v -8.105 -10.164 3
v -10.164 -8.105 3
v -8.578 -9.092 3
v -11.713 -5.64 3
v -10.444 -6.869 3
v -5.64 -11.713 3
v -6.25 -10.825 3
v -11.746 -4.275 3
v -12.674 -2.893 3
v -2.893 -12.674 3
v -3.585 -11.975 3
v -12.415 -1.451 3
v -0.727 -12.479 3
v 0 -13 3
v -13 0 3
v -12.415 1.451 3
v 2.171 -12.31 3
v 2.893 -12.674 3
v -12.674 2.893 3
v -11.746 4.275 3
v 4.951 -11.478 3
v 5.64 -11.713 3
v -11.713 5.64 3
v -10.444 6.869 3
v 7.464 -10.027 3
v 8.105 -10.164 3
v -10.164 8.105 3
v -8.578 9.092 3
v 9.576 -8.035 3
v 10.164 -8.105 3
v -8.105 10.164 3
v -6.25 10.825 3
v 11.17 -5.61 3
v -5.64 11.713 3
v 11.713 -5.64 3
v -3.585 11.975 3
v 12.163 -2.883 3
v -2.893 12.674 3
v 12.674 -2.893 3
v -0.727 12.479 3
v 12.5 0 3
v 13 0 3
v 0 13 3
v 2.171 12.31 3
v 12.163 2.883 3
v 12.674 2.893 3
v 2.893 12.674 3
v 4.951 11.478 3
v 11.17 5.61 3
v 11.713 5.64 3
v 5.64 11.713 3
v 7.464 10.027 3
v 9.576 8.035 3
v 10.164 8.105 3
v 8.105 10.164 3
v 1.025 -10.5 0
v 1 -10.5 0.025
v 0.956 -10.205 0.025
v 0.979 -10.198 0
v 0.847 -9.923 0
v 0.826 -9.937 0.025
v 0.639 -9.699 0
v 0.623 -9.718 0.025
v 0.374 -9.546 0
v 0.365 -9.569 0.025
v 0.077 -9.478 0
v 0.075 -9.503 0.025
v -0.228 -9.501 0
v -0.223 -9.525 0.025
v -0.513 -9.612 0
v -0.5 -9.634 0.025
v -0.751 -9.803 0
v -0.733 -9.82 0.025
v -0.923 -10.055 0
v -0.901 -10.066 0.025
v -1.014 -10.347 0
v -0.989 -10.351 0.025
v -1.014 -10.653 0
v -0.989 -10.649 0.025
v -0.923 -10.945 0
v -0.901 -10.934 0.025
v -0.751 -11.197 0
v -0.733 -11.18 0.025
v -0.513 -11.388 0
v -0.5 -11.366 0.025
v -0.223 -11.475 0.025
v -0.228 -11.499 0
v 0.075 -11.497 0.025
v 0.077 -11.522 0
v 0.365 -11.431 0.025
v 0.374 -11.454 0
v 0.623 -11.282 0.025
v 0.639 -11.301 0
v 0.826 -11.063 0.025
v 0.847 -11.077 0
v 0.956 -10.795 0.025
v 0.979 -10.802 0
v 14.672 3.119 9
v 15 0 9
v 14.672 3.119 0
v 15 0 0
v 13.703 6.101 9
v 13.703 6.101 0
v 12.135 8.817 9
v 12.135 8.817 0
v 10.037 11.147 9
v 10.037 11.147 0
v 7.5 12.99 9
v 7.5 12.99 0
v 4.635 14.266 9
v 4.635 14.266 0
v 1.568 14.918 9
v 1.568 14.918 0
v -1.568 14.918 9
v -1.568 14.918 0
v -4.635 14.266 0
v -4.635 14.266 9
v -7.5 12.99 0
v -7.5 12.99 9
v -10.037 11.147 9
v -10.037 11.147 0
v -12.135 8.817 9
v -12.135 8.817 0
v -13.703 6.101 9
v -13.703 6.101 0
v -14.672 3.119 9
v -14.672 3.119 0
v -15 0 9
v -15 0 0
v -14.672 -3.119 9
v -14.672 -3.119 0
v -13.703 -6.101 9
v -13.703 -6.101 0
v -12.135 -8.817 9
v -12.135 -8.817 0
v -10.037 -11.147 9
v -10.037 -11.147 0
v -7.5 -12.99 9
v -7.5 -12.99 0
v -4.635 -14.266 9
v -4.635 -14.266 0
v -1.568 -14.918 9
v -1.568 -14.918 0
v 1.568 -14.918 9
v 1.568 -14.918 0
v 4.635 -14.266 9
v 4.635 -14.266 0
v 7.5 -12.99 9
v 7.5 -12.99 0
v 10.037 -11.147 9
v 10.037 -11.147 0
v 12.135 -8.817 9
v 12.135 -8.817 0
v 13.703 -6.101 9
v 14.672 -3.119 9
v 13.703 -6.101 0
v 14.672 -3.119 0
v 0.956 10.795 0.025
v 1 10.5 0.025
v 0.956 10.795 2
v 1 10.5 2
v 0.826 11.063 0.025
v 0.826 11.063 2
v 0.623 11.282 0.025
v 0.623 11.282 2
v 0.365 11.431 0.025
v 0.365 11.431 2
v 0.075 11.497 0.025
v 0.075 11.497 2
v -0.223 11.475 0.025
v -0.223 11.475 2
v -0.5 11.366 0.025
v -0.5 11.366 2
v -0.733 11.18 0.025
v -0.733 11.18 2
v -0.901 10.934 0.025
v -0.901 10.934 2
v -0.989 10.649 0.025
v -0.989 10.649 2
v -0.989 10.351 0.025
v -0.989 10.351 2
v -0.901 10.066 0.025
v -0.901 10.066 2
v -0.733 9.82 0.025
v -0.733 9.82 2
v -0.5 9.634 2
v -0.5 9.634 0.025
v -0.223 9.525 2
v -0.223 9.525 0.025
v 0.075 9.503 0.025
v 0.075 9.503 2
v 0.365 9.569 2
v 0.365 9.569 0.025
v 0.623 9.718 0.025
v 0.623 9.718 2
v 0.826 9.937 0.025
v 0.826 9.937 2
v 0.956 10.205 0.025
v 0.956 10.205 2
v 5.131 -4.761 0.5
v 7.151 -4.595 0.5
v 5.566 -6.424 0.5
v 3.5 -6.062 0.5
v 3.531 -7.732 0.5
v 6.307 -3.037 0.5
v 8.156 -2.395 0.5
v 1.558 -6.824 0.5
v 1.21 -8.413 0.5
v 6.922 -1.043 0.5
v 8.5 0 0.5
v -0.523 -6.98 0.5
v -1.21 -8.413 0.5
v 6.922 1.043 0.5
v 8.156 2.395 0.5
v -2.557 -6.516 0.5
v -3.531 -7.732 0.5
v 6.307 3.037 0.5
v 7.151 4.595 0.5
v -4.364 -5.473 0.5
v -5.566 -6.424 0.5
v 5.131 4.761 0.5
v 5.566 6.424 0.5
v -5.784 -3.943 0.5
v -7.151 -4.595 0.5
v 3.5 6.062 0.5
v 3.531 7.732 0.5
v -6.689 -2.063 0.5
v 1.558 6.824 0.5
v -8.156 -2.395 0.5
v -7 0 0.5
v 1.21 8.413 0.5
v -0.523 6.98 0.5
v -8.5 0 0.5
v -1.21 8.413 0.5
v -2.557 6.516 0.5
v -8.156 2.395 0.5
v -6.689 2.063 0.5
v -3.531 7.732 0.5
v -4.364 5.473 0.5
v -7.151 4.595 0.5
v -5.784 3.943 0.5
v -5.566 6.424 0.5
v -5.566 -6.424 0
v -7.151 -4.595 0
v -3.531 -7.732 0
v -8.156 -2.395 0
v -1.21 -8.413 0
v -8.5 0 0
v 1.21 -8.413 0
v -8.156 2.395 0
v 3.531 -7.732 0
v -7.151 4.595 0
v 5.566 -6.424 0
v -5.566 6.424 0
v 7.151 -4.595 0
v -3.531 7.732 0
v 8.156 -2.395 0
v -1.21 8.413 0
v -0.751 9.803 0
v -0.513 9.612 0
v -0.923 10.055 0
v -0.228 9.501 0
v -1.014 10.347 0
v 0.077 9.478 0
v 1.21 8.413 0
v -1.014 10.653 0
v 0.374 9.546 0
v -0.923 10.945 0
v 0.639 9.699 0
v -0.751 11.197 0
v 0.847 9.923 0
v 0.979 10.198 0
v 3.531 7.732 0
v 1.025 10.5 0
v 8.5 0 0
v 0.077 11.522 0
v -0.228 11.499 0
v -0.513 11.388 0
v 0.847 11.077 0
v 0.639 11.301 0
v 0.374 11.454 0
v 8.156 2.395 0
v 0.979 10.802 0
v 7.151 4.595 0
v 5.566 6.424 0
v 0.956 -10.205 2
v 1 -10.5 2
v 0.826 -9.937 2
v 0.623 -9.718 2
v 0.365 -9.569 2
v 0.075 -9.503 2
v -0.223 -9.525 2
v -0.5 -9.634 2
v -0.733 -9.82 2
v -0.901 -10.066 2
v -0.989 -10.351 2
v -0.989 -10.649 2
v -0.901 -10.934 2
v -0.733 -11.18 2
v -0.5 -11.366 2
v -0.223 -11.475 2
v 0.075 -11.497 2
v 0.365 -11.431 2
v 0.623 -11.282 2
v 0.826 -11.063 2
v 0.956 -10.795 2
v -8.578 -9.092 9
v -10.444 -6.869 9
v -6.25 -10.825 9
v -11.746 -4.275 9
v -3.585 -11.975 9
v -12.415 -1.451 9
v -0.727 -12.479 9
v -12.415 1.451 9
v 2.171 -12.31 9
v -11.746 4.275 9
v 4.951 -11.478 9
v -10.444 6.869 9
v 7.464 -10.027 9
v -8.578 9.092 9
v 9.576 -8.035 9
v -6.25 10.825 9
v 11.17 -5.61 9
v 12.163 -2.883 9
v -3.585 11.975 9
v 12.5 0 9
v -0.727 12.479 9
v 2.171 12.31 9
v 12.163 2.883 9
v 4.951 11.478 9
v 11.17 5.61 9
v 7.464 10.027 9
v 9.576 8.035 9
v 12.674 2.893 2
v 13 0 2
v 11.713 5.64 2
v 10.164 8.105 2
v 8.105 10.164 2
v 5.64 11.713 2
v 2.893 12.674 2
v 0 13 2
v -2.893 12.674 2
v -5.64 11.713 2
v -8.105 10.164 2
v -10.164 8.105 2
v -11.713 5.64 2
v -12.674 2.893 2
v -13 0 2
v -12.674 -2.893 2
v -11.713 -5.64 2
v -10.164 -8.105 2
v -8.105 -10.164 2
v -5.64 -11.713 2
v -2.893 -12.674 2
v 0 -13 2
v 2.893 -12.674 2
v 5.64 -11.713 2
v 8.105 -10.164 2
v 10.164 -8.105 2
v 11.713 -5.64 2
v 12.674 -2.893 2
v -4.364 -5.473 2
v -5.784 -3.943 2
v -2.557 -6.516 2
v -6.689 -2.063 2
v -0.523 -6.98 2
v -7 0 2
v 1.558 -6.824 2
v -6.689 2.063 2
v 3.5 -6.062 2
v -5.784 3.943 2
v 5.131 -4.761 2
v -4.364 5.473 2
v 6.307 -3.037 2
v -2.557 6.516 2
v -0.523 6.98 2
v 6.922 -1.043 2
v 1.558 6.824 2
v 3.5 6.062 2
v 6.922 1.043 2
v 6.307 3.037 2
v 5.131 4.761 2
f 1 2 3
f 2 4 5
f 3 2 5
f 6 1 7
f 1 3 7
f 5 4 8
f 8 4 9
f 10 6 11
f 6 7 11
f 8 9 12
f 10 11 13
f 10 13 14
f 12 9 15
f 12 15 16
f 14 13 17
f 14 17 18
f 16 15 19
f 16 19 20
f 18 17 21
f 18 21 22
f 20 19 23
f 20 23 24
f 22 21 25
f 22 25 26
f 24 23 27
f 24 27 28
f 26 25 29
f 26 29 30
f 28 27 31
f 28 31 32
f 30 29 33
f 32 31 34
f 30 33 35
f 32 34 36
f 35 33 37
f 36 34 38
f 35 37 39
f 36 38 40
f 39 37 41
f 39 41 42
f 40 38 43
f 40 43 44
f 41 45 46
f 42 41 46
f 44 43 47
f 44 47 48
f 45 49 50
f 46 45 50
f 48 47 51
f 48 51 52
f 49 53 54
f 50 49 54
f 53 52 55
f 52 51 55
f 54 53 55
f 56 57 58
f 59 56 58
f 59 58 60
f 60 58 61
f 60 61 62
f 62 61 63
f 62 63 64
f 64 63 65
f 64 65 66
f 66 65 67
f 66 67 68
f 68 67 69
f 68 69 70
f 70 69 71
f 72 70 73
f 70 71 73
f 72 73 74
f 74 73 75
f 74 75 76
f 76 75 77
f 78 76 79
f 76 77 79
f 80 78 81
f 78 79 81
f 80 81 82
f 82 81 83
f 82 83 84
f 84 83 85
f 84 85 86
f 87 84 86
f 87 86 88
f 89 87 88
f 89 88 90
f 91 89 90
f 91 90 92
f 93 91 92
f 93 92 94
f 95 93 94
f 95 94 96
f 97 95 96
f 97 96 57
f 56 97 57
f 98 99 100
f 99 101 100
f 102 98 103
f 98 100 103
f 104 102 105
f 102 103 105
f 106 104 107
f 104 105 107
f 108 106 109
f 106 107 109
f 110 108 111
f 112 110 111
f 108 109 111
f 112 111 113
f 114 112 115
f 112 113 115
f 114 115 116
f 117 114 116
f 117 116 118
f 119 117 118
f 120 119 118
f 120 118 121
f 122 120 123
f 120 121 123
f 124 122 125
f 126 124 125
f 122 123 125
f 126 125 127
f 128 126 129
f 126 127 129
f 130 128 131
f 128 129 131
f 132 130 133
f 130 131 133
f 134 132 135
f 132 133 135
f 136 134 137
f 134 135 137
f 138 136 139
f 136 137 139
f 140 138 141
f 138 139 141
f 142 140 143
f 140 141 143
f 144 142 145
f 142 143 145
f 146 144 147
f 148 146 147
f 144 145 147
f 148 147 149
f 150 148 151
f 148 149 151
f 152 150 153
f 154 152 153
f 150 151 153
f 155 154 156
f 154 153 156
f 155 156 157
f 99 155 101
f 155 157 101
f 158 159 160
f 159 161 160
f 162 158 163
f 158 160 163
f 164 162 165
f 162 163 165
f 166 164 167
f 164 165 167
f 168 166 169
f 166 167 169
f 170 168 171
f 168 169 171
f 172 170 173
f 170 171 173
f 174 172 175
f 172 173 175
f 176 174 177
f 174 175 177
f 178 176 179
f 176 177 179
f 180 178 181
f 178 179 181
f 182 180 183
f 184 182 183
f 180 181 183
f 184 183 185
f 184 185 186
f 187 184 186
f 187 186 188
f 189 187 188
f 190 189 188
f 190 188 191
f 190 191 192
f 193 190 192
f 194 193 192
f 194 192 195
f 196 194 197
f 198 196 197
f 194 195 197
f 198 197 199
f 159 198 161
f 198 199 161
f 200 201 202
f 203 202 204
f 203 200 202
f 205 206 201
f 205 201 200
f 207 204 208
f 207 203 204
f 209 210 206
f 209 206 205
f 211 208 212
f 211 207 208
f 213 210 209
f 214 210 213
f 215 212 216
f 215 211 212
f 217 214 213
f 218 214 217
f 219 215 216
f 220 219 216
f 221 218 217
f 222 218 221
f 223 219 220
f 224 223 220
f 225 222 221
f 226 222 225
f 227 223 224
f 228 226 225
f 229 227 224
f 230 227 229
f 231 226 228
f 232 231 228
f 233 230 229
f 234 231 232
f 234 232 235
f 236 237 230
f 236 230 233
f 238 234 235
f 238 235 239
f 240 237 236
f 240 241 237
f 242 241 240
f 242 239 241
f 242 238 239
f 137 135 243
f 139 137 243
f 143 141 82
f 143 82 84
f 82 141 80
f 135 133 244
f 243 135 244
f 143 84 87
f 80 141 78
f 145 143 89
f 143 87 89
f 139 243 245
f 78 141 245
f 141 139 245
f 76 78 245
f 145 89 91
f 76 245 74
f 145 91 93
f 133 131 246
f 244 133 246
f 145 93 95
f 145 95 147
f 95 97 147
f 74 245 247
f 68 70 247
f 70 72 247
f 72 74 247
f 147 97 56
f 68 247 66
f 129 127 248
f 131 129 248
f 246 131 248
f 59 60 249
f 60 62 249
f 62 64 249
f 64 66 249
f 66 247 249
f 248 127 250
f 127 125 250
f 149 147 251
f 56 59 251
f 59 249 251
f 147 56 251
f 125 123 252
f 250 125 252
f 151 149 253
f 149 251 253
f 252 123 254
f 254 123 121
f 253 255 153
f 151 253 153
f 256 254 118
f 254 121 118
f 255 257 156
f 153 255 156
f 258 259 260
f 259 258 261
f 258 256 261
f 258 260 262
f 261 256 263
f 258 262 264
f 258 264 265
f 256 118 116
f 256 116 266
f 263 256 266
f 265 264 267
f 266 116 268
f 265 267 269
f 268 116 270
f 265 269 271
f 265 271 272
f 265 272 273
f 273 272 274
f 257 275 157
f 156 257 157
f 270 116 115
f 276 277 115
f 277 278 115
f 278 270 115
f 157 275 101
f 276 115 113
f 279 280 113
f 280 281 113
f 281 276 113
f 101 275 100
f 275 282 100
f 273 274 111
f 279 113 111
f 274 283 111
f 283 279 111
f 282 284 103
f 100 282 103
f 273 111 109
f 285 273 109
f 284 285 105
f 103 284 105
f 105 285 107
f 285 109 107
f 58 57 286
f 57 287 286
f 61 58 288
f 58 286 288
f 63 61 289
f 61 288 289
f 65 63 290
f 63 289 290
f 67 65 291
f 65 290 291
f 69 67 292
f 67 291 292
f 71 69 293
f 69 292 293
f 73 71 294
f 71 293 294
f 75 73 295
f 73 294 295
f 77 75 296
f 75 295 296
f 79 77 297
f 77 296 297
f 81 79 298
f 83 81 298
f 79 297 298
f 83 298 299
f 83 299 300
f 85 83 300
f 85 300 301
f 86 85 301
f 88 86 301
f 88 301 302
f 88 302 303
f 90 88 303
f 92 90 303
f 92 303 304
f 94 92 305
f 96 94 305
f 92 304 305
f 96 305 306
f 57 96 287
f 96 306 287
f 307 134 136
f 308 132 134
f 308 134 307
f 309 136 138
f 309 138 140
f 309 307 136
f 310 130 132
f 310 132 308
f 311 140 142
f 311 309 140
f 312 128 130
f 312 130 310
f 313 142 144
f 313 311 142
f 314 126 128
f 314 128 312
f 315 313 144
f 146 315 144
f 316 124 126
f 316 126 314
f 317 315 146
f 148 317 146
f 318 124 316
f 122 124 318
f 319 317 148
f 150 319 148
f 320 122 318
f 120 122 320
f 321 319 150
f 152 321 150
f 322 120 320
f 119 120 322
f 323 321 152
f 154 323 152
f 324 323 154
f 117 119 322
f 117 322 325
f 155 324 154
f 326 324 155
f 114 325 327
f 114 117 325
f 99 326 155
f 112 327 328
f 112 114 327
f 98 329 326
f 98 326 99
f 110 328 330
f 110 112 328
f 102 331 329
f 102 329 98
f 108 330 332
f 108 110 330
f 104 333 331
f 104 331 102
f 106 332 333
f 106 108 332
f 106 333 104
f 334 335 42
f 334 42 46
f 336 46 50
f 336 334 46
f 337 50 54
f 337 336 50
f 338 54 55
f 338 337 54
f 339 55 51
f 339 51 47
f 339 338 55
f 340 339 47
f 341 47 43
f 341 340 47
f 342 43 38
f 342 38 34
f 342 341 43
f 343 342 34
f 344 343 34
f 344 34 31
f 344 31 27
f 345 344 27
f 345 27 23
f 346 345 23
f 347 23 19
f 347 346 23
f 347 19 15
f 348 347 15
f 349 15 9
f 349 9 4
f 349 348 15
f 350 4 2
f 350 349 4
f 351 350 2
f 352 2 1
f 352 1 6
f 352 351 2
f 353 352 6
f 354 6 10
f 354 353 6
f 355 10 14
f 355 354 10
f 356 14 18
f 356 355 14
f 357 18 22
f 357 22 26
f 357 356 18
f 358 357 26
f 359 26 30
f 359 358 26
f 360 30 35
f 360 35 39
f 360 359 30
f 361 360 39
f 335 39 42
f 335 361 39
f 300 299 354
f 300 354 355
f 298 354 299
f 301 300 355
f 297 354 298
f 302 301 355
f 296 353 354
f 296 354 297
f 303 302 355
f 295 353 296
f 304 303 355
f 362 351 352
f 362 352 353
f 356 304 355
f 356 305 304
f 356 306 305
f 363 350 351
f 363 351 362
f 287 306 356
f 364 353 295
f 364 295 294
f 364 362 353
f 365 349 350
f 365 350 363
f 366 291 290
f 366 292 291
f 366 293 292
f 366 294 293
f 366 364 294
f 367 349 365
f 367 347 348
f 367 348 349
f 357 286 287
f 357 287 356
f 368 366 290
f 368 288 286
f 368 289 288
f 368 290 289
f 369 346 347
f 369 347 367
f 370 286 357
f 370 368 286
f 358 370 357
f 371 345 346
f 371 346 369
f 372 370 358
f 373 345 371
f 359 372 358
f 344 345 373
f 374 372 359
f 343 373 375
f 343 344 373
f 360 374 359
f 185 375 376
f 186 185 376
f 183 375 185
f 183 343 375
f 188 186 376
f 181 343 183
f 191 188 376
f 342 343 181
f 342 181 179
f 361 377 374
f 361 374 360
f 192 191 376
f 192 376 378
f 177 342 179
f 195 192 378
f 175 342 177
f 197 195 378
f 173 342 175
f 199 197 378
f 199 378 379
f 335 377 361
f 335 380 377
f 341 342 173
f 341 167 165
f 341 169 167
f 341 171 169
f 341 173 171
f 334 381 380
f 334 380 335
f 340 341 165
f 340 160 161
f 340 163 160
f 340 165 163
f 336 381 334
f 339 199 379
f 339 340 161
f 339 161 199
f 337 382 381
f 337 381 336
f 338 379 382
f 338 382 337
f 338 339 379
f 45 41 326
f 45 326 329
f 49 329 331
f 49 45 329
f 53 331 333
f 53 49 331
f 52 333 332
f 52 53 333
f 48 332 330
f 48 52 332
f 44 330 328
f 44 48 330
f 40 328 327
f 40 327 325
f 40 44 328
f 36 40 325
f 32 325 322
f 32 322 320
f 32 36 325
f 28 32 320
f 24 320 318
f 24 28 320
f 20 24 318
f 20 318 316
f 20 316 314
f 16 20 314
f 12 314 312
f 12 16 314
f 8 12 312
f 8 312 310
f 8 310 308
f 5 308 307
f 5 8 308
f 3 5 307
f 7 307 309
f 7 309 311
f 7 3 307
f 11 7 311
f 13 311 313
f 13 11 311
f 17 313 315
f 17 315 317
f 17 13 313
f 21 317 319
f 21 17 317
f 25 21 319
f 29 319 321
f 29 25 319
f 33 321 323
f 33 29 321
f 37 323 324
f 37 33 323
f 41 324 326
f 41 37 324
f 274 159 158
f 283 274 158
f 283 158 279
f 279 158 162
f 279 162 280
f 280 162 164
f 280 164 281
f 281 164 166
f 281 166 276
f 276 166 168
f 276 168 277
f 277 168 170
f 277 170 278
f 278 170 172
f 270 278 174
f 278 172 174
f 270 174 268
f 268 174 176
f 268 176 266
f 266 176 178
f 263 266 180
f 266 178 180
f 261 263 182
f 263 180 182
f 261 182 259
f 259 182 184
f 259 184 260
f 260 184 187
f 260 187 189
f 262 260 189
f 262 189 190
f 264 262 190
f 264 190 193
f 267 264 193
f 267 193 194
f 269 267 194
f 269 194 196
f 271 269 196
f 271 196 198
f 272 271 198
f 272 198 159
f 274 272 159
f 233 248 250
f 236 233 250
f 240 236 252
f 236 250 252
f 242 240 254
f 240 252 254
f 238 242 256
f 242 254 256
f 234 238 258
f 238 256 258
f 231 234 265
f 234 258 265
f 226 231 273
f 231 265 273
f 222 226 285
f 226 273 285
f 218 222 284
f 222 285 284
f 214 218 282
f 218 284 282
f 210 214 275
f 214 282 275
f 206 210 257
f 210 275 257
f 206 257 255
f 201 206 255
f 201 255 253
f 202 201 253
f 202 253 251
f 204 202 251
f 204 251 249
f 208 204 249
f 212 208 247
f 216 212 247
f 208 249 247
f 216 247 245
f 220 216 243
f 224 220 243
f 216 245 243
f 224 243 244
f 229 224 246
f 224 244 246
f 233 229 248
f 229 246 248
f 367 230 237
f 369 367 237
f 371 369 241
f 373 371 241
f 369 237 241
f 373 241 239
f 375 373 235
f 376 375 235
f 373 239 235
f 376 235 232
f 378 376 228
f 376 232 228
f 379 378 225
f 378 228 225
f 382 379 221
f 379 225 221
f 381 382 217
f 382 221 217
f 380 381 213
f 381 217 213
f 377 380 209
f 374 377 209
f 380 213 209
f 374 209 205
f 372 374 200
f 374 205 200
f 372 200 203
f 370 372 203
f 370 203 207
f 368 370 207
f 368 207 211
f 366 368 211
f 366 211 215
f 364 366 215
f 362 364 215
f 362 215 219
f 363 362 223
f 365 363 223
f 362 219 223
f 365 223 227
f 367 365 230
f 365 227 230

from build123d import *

# Parameters (mm, degrees)
ESQUISSE1_R                             = 15
BOSS_EXTRU_1_DEPTH                      = 2
ESQUISSE2_R                             = 15
ESQUISSE2_R_2                           = 13
BOSS_EXTRU_2_DEPTH                      = 1
ESQUISSE3_R                             = 15
ESQUISSE3_R_2                           = 12.5
BOSS_EXTRU_3_DEPTH                      = 6
ESQUISSE5_R                             = 8.5
ENL_V_MAT_EXTRU_1_DEPTH                 = 0.5
ESQUISSE6_R                             = 7
ENL_V_MAT_EXTRU_2_DEPTH                 = 1.5
DIAM_TRE_DU_PER_AGE_2_0_2_1_D           = 2
DIAM_TRE_DU_PER_AGE_2_0_2_1_CSINK_D     = 2.05
DIAM_TRE_DU_PER_AGE_2_0_2_1_CSINK_ANGLE = 90


with BuildPart() as part:
    # Esquisse1 → Boss.-Extru.1 (new body)
    with BuildSketch(Plane.XY):
        Circle(ESQUISSE1_R)
    extrude(amount=BOSS_EXTRU_1_DEPTH)

    # Esquisse2 → Boss.-Extru.2 (add)
    with BuildSketch(Plane.XY.offset(2)):
        Circle(ESQUISSE2_R)
        Circle(ESQUISSE2_R_2, mode=Mode.SUBTRACT)
    extrude(amount=BOSS_EXTRU_2_DEPTH)

    # Esquisse3 → Boss.-Extru.3 (add)
    with BuildSketch(Plane.XY.offset(3)):
        Circle(ESQUISSE3_R)
        Circle(ESQUISSE3_R_2, mode=Mode.SUBTRACT)
    extrude(amount=BOSS_EXTRU_3_DEPTH)

    # Esquisse5 → Enlèv. mat.-Extru.1 (cut)
    with BuildSketch(Plane(origin=(0, 0, 0), x_dir=(-1, 0, 0), z_dir=(0, 0, -1))):
        Circle(ESQUISSE5_R)
    extrude(amount=-ENL_V_MAT_EXTRU_1_DEPTH, mode=Mode.SUBTRACT)

    # Esquisse6 → Enlèv. mat.-Extru.2 (cut)
    with BuildSketch(Plane(origin=(0, 0, 0.5), x_dir=(-1, 0, 0), z_dir=(0, 0, -1))):
        Circle(ESQUISSE6_R)
    extrude(amount=-ENL_V_MAT_EXTRU_2_DEPTH, mode=Mode.SUBTRACT)

    # Diamètre du perçage Ø2.0 (2)1 (through all)
    with Locations(Plane(origin=(0, 0, 0), x_dir=(-1, 0, 0), z_dir=(0, 0, -1))):
        with Locations((0, -10.5), (0, 10.5)):
            CounterSinkHole(DIAM_TRE_DU_PER_AGE_2_0_2_1_D / 2, DIAM_TRE_DU_PER_AGE_2_0_2_1_CSINK_D / 2, counter_sink_angle=DIAM_TRE_DU_PER_AGE_2_0_2_1_CSINK_ANGLE)


solid = part.part
